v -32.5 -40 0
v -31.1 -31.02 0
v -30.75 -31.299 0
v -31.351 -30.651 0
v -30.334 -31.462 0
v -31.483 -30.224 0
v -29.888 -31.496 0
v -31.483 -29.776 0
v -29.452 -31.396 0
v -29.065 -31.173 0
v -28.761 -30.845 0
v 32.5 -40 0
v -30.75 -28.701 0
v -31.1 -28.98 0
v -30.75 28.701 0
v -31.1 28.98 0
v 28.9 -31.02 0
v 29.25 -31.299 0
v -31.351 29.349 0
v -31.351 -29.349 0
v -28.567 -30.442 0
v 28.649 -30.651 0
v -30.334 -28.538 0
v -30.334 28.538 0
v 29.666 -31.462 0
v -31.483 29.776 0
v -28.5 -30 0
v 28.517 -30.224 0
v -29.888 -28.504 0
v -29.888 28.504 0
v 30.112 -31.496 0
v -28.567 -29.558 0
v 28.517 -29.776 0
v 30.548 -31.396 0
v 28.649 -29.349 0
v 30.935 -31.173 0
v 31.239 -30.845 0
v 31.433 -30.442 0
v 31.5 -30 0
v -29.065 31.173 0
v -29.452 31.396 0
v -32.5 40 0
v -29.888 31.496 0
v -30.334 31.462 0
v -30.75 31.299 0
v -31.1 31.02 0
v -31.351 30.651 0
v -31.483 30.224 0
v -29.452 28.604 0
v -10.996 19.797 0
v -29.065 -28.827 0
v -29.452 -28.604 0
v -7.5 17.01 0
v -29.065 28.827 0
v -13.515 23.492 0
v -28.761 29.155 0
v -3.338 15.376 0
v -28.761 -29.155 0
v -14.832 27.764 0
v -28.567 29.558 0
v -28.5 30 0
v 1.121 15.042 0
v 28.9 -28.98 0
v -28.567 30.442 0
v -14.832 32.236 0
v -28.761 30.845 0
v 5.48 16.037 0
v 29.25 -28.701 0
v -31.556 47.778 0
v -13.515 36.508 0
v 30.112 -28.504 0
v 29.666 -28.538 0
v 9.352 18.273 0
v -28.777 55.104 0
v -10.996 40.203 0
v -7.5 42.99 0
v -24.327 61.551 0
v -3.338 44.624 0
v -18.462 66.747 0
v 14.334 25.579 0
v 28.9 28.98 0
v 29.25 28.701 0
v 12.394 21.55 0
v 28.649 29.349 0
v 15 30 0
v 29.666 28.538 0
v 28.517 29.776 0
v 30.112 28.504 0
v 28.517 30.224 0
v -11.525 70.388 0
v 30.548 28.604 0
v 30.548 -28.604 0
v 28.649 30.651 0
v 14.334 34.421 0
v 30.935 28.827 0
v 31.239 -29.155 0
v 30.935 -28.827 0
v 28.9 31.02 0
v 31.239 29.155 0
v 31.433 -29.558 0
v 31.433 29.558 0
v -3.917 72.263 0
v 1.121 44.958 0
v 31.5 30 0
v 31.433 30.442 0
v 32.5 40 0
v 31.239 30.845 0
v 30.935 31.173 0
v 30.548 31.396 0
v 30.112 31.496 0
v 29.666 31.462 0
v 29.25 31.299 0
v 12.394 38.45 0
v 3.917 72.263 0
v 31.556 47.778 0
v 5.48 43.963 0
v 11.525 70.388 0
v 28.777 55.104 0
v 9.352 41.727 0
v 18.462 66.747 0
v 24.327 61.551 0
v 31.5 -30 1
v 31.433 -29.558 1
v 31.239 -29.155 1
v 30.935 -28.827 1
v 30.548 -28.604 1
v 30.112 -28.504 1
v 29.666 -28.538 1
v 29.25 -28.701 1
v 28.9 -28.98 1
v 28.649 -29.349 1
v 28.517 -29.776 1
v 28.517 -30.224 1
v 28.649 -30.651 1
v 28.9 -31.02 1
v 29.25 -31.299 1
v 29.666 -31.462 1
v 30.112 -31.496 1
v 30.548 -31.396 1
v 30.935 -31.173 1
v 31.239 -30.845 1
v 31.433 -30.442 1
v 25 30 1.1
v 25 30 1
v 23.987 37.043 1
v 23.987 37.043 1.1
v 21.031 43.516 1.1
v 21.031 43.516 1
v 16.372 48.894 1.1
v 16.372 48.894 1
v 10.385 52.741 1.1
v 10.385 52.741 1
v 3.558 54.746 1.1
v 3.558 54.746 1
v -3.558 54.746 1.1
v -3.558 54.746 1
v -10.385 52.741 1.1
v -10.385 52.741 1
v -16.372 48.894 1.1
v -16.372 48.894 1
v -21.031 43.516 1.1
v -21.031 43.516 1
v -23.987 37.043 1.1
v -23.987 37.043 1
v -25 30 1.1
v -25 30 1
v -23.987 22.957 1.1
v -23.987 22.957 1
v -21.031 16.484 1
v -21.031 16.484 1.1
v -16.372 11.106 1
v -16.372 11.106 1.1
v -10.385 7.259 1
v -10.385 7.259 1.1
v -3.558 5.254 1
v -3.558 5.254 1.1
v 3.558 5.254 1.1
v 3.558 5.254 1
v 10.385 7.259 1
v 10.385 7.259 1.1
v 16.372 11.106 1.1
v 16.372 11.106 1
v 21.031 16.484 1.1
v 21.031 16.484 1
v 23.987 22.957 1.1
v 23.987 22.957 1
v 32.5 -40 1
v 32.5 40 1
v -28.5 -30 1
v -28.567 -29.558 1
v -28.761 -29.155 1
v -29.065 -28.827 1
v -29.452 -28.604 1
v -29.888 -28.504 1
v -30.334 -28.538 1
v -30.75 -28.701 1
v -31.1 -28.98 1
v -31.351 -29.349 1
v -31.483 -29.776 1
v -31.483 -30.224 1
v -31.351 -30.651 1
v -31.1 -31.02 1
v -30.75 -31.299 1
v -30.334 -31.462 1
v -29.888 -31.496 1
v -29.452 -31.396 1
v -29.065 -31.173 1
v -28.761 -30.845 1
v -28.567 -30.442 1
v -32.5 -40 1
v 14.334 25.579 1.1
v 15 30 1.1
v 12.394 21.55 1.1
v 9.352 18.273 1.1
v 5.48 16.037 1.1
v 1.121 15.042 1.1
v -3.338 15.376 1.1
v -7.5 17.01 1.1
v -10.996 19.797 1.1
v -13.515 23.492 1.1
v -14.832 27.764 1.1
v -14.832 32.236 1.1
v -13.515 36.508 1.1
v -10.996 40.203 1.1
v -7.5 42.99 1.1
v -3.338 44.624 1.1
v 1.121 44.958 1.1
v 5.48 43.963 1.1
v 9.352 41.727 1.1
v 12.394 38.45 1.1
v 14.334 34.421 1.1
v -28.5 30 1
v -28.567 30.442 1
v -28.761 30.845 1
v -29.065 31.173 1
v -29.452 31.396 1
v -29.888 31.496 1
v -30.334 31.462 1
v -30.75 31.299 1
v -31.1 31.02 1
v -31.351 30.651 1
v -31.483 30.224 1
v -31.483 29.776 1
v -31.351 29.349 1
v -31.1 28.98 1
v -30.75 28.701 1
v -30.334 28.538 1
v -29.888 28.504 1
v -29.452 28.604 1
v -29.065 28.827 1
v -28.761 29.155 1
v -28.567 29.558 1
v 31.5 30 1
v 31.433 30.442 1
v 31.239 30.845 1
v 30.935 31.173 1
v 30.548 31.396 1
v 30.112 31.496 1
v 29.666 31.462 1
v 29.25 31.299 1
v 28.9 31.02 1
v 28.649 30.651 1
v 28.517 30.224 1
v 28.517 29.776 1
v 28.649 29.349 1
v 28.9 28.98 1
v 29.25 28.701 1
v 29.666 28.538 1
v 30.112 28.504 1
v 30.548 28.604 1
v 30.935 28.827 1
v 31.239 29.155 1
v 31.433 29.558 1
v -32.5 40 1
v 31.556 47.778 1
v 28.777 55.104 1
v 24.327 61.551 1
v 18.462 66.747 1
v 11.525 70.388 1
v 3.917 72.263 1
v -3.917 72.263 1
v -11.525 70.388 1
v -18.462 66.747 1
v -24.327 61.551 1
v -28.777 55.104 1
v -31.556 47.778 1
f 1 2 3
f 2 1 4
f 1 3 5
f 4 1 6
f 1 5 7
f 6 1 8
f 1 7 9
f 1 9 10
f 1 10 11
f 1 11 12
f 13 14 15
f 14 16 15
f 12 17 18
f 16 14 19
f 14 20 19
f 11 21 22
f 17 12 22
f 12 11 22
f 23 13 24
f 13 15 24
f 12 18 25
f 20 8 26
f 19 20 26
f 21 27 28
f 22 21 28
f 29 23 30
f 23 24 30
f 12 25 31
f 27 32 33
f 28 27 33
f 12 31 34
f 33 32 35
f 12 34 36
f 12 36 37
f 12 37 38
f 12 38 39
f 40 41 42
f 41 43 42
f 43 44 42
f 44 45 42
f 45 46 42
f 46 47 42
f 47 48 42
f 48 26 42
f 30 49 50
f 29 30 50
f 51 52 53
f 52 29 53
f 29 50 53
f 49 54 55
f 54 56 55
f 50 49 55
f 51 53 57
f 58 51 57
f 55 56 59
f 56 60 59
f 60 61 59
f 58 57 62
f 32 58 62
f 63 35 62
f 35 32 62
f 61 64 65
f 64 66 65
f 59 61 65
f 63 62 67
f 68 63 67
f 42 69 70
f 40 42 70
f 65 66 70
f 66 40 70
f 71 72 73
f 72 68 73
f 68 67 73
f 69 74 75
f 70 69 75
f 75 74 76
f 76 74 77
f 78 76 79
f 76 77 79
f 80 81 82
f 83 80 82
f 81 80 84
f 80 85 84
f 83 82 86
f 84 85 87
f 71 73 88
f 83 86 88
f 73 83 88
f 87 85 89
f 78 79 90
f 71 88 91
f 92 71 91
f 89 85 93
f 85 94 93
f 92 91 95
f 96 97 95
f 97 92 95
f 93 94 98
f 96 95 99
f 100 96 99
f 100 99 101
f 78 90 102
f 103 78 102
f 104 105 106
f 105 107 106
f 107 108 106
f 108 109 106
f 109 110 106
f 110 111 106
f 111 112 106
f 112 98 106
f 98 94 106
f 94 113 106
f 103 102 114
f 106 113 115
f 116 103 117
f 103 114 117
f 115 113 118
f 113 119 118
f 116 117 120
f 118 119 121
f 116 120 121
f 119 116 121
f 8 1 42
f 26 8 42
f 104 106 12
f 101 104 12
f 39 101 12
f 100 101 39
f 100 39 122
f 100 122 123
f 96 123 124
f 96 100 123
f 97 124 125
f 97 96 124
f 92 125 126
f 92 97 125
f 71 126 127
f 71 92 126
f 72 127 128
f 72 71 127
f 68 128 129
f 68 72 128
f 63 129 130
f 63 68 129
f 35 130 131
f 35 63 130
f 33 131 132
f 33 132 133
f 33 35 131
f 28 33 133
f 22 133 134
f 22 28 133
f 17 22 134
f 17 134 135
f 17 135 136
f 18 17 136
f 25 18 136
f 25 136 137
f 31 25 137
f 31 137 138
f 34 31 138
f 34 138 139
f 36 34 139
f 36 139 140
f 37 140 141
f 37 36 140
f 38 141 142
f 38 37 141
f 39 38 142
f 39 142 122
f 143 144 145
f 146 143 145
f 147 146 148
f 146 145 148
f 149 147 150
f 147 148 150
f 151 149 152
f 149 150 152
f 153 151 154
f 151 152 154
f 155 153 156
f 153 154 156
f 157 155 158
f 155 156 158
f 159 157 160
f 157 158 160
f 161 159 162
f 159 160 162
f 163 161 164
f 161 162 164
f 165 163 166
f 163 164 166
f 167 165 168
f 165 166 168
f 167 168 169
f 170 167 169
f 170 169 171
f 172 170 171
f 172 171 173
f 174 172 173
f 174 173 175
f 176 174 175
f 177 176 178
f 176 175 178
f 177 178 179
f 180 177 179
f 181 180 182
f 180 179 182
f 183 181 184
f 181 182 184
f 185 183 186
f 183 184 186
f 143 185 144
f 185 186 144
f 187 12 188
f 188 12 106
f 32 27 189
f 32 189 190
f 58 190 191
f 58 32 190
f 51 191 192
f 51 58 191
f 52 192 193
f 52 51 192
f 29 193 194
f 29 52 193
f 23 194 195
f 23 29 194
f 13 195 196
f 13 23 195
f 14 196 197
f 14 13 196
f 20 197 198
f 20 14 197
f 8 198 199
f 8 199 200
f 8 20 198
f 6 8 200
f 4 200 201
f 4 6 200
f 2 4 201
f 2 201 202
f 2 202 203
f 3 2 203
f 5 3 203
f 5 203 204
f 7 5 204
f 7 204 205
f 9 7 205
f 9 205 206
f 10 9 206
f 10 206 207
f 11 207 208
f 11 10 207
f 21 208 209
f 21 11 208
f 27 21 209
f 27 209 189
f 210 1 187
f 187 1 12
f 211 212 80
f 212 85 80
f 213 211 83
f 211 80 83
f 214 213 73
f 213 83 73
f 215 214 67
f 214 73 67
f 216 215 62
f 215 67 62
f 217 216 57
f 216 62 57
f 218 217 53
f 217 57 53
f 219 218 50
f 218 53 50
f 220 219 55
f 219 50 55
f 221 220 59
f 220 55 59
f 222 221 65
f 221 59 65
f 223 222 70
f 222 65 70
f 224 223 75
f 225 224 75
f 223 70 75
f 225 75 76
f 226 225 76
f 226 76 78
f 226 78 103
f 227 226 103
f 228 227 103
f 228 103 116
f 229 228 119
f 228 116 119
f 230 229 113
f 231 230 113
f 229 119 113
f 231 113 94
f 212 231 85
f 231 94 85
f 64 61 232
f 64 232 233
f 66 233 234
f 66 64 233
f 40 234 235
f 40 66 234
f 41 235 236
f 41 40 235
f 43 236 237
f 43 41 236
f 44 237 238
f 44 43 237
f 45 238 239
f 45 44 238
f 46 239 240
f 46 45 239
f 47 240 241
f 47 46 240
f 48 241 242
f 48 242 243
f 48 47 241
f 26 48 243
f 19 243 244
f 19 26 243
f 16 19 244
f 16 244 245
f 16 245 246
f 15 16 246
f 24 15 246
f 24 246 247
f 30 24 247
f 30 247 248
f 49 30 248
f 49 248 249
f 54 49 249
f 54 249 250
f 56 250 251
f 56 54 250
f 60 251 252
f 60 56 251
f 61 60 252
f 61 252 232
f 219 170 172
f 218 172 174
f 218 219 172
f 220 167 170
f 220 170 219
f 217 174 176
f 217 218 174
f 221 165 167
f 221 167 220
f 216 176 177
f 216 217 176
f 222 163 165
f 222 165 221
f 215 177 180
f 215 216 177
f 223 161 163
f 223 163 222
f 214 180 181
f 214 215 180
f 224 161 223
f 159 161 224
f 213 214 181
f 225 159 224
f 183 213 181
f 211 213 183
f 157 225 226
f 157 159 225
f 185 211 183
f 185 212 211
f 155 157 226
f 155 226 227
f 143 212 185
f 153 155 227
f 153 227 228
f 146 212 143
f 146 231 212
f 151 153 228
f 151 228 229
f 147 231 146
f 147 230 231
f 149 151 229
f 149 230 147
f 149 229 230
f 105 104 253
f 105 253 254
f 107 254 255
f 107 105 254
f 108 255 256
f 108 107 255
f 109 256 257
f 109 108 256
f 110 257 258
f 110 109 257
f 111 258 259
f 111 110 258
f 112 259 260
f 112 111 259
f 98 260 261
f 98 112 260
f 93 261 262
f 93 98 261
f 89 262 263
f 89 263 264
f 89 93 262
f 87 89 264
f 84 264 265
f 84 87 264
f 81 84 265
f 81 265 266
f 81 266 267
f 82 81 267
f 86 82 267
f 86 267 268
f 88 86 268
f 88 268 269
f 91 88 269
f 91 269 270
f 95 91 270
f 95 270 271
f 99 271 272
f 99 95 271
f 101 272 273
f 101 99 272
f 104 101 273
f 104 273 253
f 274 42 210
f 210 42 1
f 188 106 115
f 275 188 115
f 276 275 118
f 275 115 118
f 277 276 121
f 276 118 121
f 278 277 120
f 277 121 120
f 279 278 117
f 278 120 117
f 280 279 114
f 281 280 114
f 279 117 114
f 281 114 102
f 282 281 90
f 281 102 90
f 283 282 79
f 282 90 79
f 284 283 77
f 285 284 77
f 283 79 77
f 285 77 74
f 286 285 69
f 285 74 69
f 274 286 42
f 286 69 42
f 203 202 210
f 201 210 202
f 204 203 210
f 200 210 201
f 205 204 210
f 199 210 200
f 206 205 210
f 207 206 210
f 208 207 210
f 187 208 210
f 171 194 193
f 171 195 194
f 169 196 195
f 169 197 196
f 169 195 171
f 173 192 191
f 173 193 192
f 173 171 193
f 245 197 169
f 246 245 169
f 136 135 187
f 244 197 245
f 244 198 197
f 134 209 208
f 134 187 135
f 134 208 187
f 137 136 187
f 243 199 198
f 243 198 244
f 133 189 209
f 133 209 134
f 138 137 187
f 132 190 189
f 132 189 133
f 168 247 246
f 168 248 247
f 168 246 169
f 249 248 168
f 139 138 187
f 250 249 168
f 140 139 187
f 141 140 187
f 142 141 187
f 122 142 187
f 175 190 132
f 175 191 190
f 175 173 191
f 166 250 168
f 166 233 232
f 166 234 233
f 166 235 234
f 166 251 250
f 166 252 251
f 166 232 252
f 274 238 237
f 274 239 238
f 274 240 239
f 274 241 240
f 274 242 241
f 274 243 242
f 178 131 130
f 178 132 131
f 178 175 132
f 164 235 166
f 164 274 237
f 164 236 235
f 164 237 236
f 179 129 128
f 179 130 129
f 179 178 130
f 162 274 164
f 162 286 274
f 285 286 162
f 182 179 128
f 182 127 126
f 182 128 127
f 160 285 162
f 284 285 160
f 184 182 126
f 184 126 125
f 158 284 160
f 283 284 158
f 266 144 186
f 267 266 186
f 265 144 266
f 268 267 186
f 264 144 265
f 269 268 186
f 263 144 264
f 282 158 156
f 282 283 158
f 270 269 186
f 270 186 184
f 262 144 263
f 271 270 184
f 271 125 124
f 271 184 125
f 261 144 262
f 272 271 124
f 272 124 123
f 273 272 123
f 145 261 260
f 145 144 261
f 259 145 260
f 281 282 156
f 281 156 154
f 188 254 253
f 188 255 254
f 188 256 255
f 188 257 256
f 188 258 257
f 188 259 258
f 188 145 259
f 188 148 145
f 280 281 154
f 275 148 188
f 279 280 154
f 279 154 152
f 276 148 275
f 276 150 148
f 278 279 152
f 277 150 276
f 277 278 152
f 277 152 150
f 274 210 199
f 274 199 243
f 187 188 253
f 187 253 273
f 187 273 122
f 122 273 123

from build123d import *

# Parameters (mm, degrees)
SKETCH1_R           = 1.5
SKETCH1_R_2         = 15
BOSS_EXTRUDE1_DEPTH = 1
SKETCH2_R           = 25
BOSS_EXTRUDE2_DEPTH = 0.1
SKETCH3_R           = 15
CUT_EXTRUDE1_DEPTH  = 1


with BuildPart() as part:
    # Sketch1 → Boss-Extrude1 (new body)
    with BuildSketch(Plane.XY):
        with BuildLine():
            Line((-32.5, 40), (-32.5, -40))
            Line((-32.5, -40), (32.5, -40))
            Line((32.5, -40), (32.5, 40))
            ThreePointArc((32.5, 40), (0, 72.5), (-32.5, 40))
        make_face()
        with Locations((-30, -30)):
            Circle(SKETCH1_R, mode=Mode.SUBTRACT)
        with Locations((-30, 30)):
            Circle(SKETCH1_R, mode=Mode.SUBTRACT)
        with Locations((30, -30)):
            Circle(SKETCH1_R, mode=Mode.SUBTRACT)
        with Locations((30, 30)):
            Circle(SKETCH1_R, mode=Mode.SUBTRACT)
        with Locations((0, 30)):
            Circle(SKETCH1_R_2, mode=Mode.SUBTRACT)
    extrude(amount=BOSS_EXTRUDE1_DEPTH)

    # Sketch2 → Boss-Extrude2 (add)
    with BuildSketch(Plane.XY.offset(1)):
        with Locations((0, 30)):
            Circle(SKETCH2_R)
    extrude(amount=BOSS_EXTRUDE2_DEPTH)

    # Sketch3 → Cut-Extrude1 (cut)
    with BuildSketch(Plane(origin=(0, 0, 1), x_dir=(-1, 0, 0), z_dir=(0, 0, -1))):
        with Locations(Location((0, 30, 0), (0, 0, 180))):
            Circle(SKETCH3_R)
    extrude(amount=-CUT_EXTRUDE1_DEPTH, mode=Mode.SUBTRACT)


solid = part.part
